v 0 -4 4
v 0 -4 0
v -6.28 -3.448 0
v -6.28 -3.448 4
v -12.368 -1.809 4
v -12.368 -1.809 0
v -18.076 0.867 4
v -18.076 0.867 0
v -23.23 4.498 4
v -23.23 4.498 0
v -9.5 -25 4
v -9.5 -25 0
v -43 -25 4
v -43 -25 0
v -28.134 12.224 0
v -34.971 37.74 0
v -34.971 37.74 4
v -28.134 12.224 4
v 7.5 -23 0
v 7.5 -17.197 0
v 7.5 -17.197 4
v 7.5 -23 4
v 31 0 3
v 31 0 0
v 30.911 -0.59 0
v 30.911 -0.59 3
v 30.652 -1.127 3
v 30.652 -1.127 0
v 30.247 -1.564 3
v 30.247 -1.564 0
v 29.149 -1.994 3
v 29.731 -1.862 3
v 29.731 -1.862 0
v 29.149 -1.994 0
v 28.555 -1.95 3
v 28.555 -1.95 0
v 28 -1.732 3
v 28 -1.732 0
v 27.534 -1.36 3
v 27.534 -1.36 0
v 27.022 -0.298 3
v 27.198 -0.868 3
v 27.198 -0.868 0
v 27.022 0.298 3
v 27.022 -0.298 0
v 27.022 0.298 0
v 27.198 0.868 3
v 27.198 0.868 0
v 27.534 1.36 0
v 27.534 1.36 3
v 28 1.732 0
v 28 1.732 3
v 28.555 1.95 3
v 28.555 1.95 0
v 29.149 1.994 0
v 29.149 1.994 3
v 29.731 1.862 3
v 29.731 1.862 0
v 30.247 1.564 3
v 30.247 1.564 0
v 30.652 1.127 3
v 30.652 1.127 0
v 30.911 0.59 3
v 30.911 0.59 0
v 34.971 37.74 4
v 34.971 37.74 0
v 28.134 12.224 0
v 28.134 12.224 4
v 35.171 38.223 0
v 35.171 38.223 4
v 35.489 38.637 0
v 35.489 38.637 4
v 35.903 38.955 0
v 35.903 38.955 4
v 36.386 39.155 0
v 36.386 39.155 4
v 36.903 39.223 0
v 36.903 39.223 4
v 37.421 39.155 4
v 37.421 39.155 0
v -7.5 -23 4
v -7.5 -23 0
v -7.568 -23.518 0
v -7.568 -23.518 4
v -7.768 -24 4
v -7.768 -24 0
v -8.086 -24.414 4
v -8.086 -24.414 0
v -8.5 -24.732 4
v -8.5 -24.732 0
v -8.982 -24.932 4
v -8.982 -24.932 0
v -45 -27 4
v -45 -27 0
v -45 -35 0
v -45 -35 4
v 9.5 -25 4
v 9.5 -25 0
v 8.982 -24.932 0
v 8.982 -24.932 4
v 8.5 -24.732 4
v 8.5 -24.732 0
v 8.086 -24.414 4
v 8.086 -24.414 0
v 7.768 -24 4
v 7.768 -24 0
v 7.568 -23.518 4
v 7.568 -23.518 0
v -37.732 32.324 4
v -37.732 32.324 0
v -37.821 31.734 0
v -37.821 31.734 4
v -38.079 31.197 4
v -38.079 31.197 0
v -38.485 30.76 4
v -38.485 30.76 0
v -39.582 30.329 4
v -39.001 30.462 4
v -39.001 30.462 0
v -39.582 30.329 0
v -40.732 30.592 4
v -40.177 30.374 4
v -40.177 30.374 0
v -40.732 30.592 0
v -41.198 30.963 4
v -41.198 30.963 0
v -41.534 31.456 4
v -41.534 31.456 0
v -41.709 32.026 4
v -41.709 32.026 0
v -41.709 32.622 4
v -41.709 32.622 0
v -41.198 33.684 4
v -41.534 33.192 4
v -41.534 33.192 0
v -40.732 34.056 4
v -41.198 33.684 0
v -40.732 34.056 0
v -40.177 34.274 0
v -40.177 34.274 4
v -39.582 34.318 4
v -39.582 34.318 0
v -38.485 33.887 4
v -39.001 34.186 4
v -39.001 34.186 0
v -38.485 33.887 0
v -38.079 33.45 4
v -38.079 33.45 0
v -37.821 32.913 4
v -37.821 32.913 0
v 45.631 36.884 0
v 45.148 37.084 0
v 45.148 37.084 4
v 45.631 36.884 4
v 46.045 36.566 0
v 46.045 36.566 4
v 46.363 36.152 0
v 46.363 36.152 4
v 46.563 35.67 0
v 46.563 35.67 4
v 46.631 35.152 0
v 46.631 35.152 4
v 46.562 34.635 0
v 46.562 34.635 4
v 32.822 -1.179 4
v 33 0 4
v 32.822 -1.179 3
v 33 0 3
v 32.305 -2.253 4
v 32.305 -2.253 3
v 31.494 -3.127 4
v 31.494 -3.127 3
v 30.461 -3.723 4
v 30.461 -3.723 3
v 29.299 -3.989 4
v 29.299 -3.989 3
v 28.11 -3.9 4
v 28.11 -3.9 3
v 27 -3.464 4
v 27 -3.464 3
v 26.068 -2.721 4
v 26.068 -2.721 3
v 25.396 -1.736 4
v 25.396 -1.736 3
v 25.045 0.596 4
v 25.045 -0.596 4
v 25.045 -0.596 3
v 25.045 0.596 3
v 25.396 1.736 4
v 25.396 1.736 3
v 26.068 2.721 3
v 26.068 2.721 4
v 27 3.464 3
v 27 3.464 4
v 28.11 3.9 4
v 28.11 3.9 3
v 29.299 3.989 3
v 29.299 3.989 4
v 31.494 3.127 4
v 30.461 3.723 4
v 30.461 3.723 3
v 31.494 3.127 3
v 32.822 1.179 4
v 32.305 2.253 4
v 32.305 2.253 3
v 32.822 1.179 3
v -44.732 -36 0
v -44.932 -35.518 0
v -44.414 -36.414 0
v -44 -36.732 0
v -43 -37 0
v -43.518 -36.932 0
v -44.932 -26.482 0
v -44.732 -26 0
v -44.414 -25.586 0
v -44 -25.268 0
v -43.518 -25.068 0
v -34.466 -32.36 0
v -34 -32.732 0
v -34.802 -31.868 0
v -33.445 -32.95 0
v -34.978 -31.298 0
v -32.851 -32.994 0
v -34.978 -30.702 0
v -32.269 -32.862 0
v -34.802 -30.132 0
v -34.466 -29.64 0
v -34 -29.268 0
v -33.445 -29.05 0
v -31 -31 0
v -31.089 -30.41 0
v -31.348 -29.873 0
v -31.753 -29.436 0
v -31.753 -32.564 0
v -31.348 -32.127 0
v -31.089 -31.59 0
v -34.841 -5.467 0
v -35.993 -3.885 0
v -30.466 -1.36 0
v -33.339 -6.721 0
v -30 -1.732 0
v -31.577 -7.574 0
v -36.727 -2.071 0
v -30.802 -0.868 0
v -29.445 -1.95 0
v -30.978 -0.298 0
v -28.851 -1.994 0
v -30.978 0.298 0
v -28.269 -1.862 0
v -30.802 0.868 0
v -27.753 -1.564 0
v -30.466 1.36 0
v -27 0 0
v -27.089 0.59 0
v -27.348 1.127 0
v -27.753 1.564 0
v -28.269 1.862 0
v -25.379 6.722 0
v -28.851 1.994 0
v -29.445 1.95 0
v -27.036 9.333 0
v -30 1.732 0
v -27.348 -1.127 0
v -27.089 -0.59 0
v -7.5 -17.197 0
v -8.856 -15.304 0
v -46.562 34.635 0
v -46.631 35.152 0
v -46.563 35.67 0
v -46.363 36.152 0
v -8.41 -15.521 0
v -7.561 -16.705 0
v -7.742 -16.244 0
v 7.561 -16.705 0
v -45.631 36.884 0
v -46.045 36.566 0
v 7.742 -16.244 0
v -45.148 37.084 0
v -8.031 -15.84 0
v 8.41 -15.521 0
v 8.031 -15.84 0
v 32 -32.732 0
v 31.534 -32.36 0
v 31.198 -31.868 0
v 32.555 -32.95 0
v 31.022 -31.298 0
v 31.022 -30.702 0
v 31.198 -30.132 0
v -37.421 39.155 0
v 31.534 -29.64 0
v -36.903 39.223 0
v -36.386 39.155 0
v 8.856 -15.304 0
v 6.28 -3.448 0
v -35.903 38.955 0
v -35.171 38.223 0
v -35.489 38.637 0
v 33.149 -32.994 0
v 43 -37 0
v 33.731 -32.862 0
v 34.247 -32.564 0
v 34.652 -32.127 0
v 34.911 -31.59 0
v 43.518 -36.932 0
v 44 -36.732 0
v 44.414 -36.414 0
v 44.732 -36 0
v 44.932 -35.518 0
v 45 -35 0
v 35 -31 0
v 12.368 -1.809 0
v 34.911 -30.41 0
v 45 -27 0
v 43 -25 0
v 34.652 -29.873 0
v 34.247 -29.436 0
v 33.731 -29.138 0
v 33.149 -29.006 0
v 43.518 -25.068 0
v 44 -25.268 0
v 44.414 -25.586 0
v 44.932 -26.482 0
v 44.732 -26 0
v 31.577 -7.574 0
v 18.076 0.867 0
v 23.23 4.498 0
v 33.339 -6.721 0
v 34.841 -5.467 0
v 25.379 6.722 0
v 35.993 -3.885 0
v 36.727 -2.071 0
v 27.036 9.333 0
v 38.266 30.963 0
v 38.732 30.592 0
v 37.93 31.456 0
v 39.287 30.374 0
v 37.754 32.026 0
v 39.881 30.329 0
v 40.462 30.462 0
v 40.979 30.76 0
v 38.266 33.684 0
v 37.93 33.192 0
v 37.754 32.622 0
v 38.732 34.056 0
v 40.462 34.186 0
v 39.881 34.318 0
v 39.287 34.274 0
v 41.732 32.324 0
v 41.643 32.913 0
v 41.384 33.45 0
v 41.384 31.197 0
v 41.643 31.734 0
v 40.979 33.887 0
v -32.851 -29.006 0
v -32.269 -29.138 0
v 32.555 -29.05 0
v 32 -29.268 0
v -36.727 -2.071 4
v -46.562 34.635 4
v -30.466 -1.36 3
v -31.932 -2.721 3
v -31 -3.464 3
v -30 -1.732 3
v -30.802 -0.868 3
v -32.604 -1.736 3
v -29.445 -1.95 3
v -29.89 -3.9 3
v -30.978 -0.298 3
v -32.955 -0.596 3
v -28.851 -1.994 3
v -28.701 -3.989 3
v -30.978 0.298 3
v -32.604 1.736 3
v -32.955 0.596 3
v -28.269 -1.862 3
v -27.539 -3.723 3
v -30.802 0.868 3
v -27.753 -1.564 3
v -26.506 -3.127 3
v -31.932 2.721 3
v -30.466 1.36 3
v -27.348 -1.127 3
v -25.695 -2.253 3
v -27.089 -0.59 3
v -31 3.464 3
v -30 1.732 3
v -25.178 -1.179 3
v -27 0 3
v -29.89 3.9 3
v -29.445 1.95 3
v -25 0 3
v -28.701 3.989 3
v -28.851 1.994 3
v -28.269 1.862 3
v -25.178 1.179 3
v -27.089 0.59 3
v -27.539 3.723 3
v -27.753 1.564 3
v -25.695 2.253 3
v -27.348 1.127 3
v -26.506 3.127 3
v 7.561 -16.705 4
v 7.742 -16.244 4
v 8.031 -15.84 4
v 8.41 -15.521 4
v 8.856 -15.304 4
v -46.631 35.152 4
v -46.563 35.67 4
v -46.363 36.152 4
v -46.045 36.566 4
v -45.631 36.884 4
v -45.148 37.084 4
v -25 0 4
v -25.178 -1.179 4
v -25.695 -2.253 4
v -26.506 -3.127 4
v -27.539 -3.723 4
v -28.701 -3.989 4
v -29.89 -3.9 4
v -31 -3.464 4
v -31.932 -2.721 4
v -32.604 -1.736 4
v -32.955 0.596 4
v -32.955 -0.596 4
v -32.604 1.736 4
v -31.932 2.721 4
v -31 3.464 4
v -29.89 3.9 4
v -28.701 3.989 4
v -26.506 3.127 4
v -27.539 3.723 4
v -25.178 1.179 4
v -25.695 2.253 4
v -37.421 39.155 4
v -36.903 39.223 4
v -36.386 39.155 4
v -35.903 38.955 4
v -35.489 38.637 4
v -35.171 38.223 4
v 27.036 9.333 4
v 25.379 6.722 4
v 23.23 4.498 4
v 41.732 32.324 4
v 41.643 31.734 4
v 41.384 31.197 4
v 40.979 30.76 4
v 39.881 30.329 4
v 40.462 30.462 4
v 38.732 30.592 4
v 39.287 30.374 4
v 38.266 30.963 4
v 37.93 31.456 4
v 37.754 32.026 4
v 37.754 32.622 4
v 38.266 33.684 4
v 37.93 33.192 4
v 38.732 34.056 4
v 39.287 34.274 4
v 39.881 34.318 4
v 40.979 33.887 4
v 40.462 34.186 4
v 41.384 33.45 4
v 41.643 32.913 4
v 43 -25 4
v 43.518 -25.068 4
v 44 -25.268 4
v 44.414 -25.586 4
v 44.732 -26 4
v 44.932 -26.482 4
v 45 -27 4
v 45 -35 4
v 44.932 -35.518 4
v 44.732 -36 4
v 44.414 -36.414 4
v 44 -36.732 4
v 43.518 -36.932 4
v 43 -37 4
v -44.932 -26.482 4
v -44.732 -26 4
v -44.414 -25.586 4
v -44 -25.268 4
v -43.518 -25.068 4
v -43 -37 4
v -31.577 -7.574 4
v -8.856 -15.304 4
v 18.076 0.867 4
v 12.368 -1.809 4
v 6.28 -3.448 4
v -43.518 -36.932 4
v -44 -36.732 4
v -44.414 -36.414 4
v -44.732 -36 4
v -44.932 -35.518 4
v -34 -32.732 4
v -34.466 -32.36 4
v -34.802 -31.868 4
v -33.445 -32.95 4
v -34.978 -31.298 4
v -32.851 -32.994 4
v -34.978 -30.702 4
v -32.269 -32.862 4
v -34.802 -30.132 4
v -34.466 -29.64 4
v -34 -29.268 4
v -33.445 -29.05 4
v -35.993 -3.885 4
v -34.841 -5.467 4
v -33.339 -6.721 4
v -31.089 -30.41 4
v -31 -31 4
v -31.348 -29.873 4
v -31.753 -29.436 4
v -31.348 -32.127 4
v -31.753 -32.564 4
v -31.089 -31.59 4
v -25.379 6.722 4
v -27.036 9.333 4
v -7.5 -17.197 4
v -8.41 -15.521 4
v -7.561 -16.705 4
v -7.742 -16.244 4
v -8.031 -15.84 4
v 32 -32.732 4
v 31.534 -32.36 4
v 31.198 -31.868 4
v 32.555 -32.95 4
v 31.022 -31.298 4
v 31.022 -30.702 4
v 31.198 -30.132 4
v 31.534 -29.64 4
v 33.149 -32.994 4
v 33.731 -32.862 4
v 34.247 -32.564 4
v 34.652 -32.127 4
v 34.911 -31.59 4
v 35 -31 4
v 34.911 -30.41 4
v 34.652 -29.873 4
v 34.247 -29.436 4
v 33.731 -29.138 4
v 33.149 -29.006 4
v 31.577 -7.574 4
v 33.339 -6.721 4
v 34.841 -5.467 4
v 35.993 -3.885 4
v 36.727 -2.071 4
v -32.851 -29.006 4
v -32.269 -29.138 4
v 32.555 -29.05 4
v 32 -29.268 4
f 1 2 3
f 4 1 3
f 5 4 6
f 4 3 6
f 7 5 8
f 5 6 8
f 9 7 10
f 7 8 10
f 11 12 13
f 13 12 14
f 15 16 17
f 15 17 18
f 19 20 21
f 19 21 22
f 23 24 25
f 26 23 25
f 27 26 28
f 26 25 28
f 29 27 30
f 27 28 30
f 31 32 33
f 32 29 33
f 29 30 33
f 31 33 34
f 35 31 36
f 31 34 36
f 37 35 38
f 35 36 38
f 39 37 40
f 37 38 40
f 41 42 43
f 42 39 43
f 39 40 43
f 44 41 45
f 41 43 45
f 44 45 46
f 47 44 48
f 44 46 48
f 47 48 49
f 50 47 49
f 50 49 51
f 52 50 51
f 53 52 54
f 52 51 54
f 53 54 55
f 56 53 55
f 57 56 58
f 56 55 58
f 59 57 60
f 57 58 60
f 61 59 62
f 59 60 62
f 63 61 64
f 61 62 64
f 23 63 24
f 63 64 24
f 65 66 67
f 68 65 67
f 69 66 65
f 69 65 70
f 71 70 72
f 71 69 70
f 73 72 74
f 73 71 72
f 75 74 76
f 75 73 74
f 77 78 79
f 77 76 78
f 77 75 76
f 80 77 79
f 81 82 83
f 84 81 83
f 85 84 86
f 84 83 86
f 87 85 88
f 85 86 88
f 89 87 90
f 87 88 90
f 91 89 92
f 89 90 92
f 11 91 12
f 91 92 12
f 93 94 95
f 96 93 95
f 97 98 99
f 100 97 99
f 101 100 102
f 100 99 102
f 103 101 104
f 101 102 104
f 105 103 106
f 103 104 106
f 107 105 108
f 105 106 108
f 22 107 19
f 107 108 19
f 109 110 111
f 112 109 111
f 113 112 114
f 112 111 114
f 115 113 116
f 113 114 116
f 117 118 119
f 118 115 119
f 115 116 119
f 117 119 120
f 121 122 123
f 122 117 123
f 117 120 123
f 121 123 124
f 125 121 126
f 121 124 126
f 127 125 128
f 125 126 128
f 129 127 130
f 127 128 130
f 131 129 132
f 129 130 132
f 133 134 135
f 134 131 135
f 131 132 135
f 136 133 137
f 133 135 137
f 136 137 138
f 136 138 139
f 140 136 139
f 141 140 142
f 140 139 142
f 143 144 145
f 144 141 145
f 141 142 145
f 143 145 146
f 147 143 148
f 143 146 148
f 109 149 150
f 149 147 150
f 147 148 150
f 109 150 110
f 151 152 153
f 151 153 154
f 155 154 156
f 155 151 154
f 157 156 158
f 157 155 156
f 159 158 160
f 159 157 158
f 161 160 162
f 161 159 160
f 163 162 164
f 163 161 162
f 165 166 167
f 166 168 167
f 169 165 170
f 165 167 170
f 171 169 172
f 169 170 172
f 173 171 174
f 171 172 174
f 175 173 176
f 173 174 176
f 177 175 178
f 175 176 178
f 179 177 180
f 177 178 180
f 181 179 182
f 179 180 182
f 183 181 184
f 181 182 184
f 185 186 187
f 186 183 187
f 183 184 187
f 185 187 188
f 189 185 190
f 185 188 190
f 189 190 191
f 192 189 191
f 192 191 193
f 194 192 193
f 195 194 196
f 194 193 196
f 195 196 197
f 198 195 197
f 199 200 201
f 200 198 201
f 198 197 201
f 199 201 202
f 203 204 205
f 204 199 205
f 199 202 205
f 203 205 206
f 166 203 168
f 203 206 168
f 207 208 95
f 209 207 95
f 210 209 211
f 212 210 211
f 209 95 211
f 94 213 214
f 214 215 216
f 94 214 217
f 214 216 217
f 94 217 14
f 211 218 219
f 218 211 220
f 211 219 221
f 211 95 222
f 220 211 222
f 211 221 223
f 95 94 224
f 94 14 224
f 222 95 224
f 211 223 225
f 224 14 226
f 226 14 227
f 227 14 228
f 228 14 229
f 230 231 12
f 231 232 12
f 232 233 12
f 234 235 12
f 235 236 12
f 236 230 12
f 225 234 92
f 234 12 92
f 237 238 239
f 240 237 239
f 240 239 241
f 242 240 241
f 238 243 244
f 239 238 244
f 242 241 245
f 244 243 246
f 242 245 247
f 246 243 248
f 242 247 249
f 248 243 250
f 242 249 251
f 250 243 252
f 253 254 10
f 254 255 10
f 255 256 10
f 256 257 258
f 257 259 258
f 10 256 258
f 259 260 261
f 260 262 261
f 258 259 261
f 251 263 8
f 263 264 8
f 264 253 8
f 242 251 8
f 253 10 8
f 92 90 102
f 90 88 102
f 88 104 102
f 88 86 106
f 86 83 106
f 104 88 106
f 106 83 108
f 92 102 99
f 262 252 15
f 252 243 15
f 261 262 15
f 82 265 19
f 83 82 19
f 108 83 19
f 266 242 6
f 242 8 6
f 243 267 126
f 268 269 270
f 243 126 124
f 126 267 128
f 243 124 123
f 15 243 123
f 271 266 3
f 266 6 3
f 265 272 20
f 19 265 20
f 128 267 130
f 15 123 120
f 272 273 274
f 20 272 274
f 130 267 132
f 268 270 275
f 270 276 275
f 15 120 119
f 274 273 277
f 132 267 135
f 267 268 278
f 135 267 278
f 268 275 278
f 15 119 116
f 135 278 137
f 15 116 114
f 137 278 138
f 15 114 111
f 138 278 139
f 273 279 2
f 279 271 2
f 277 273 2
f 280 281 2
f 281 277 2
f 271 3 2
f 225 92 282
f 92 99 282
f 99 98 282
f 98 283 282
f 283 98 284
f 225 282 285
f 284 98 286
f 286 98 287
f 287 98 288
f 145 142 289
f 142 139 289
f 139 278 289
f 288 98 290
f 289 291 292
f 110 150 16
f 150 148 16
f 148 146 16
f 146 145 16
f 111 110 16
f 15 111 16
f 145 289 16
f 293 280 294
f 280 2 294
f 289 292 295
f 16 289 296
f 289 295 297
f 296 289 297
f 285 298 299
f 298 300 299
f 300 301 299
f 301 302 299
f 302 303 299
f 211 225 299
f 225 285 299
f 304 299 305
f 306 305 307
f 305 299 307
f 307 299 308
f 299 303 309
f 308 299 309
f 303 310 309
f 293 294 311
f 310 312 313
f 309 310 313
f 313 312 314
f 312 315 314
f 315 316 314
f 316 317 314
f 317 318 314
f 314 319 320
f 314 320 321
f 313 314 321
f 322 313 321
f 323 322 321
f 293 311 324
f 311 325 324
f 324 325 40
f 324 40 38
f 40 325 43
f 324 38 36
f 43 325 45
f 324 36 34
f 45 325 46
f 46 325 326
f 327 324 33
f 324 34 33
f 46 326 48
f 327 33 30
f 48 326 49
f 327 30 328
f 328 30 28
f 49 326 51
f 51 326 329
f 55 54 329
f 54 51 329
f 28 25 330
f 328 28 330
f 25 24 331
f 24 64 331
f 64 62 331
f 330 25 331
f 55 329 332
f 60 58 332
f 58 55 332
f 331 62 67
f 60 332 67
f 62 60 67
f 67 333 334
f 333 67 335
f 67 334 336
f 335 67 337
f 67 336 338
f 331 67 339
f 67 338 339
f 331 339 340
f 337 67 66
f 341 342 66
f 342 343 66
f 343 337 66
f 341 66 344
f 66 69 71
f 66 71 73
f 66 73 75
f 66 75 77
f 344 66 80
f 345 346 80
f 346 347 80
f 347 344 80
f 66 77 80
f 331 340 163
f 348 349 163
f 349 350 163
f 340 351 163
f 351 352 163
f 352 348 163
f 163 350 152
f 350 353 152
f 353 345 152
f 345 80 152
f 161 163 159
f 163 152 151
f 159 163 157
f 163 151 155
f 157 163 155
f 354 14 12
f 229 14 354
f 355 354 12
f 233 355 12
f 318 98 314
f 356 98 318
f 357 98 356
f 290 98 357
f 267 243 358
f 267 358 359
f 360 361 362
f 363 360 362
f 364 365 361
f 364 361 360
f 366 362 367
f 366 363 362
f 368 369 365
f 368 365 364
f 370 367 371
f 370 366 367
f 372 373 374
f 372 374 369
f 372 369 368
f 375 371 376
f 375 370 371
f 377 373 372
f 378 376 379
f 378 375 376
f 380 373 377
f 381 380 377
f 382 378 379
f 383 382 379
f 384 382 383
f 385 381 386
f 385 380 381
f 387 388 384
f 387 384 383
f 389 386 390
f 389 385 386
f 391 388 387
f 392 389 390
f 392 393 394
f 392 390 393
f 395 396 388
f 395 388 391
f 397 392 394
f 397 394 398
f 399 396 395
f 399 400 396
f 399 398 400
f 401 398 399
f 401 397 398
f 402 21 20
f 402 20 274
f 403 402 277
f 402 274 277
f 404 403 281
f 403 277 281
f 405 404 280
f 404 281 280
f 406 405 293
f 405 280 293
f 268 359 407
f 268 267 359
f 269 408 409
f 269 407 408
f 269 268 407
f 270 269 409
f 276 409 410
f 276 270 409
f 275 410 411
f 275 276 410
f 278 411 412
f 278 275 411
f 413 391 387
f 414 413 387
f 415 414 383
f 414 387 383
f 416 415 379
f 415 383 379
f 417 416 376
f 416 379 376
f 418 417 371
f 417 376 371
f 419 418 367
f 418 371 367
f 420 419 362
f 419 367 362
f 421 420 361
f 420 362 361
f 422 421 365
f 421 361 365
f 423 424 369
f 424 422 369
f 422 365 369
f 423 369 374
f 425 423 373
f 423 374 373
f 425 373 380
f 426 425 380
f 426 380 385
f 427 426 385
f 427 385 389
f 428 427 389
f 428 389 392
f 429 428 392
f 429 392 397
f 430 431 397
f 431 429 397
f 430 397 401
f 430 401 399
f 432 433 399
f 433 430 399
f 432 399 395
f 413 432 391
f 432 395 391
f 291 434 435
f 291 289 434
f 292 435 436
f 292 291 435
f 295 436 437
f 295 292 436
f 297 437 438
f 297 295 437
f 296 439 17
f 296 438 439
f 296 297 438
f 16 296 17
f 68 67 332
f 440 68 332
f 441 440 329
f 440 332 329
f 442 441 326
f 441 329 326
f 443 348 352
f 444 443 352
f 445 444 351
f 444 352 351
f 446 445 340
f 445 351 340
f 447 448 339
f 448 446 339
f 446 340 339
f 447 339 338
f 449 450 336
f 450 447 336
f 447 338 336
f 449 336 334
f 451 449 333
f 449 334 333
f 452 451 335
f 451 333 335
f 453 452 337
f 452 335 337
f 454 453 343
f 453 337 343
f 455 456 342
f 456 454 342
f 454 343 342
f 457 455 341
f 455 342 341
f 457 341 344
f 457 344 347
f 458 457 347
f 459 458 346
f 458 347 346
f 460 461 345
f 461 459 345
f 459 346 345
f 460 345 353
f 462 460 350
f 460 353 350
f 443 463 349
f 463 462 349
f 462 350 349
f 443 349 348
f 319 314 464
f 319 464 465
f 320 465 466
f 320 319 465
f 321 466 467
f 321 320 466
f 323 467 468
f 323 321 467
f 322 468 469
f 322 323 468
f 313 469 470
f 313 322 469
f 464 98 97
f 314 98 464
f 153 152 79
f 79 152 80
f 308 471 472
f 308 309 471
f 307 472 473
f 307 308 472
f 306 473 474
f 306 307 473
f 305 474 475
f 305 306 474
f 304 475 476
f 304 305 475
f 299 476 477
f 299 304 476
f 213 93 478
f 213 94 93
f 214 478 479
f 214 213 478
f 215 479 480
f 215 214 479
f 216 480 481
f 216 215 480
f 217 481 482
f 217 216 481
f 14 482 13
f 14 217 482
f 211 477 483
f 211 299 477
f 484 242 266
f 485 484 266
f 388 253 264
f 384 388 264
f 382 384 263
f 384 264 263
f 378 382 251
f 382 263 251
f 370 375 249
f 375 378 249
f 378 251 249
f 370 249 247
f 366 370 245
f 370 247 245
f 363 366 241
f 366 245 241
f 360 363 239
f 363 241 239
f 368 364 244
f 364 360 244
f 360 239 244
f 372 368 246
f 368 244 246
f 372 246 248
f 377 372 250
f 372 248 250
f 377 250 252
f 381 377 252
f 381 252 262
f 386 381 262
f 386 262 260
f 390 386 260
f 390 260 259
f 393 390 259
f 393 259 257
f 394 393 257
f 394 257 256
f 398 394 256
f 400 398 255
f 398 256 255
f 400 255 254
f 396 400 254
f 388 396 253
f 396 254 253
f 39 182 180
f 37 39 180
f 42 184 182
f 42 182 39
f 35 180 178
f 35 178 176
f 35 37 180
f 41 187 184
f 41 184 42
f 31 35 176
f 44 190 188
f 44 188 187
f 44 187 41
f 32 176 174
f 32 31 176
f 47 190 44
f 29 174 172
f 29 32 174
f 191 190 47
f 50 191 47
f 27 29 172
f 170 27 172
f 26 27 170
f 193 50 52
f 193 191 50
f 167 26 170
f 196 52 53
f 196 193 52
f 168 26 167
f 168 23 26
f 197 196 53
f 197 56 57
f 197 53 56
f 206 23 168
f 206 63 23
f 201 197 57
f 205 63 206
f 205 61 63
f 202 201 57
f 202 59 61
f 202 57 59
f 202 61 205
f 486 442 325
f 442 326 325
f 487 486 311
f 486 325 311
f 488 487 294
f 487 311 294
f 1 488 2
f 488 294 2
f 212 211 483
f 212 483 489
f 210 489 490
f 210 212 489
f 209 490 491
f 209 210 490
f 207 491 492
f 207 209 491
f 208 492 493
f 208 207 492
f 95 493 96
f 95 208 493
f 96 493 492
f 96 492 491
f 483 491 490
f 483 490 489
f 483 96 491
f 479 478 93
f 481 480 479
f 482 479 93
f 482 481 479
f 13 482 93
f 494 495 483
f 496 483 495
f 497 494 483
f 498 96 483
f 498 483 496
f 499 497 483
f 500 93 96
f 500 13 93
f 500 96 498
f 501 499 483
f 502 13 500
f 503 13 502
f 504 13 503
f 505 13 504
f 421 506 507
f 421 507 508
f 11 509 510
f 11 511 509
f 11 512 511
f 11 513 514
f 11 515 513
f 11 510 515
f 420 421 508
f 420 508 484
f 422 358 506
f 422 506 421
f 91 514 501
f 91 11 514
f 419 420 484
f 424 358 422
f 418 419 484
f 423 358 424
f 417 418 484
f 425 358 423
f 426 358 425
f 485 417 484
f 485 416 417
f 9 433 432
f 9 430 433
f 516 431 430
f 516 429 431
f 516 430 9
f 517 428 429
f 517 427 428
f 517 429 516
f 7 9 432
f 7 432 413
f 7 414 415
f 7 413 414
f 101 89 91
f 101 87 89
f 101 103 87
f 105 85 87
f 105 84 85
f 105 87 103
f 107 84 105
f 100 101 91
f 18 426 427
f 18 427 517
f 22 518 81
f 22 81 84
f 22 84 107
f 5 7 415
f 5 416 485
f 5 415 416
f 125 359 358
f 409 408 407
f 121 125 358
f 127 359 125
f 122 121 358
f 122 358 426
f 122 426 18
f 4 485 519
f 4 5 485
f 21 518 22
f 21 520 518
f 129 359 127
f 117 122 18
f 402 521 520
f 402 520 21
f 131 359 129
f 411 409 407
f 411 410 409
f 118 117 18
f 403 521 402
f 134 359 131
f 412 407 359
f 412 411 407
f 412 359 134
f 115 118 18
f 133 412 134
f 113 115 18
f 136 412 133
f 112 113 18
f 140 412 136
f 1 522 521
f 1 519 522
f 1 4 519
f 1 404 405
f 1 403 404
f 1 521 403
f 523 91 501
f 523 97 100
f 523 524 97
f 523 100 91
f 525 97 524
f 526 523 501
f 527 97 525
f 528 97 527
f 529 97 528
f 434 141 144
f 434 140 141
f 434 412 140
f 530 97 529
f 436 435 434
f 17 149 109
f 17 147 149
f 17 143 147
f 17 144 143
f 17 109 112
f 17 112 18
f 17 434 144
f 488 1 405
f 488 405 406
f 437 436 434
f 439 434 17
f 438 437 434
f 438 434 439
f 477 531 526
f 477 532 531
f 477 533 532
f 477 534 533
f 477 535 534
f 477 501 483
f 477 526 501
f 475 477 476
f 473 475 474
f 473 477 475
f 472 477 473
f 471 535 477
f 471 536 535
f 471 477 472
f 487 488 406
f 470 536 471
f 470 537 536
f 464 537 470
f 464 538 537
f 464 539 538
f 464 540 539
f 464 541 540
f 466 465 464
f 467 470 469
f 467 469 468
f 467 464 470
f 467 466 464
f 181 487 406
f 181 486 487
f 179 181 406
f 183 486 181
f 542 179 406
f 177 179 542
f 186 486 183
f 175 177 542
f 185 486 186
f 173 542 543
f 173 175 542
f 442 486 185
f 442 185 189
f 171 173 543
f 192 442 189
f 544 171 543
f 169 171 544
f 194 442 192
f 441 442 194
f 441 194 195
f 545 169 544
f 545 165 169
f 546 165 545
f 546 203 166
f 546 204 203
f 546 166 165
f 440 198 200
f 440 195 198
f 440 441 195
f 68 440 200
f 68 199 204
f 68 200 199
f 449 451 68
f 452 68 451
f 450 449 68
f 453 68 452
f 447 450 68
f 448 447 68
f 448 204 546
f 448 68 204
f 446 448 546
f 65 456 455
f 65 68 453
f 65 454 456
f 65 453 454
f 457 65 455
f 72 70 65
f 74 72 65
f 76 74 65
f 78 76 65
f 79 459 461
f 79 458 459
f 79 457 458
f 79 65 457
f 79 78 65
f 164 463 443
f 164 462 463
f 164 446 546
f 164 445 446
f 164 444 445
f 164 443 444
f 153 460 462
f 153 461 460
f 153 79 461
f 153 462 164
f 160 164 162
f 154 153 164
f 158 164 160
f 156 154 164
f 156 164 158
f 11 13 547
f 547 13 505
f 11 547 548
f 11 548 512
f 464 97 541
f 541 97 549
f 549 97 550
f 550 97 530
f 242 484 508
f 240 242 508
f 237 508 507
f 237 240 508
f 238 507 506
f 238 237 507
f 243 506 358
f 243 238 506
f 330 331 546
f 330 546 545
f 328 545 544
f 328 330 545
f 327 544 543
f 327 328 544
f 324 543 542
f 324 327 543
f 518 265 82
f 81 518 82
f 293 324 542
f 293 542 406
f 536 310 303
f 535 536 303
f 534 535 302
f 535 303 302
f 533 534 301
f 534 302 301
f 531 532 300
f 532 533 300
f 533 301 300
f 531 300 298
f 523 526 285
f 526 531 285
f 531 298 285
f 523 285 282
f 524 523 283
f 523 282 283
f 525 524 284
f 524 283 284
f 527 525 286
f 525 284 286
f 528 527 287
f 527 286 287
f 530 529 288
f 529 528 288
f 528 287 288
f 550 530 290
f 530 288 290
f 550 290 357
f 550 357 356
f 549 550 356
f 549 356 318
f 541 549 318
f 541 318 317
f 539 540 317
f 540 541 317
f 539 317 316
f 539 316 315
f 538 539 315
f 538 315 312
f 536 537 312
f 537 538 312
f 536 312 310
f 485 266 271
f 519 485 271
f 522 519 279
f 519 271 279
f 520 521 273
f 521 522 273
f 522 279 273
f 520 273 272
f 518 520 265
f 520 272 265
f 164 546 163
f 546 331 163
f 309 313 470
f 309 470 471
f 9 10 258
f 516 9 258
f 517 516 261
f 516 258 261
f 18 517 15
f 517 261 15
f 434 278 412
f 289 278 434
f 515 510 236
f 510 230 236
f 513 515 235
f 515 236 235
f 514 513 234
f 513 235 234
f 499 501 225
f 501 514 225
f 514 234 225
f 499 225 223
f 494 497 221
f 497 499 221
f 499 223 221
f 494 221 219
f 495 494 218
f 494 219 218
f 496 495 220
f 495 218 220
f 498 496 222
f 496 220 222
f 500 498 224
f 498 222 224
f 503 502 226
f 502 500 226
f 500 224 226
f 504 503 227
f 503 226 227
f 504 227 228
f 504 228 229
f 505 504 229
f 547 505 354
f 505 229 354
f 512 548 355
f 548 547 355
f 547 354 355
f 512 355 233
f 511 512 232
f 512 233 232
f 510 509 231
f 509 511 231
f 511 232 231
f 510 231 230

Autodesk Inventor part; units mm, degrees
ref_plane "YZ Plane" through (0, 0, 0) normal (1, 0, 0) x (0, 1, 0)
ref_plane "XZ Plane" through (0, 0, 0) normal (0, 1, 0) x (-1, 0, 0)
ref_plane "XY Plane" through (0, 0, 0) normal (0, 0, 1) x (1, 0, 0)
sketch "Sketch1" plane through (0, 0, 0) normal (0, 0, 1) x (1, 0, 0)
  circle A0 centre (-29, 0) radius 2
  line L0 (-62.2888, 0) -> (62.2888, 0) construction
  arc A1 (-36.7274, -2.0706) -> (-31.5768, -7.5737) centre (-29, 0) ccw
  arc A2 (-23.2301, 4.498) -> (0, -4) centre (0, 32) ccw
  line L1 (0, -55.9324) -> (0, 55.5944) construction
  line L2 (-31.5768, -7.5737) -> (-8.8558, -15.304)
  line L3 (-7.5, -17.1974) -> (-7.5, -23)
  line L4 (-36.7274, -2.0706) -> (-46.5625, 34.6346)
  line L5 (-45.1483, 37.0841) -> (-37.4209, 39.1547)
  line L6 (-34.9714, 37.7405) -> (-28.1342, 12.2236)
  arc A3 (-7.5, -17.1974) -> (-8.8558, -15.304) centre (-9.5, -17.1974) ccw
  arc A4 (-45.1483, 37.0841) -> (-46.5625, 34.6346) centre (-44.6307, 35.1523) ccw
  arc A5 (-34.9714, 37.7405) -> (-37.4209, 39.1547) centre (-36.9033, 37.2228) ccw
  circle A6 centre (29, 0) radius 2
  line L7 (62.2888, 0) -> (-62.2888, 0) construction
  arc A7 (31.5768, -7.5737) -> (36.7274, -2.0706) centre (29, 0) ccw
  line L8 (31.5768, -7.5737) -> (8.8558, -15.304)
  line L9 (7.5, -17.1974) -> (7.5, -25)
  line L10 (36.7274, -2.0706) -> (46.5625, 34.6346)
  line L11 (45.1483, 37.0841) -> (37.4209, 39.1547)
  arc A8 (8.8558, -15.304) -> (7.5, -17.1974) centre (9.5, -17.1974) ccw
  arc A9 (46.5625, 34.6346) -> (45.1483, 37.0841) centre (44.6307, 35.1523) ccw
  arc A10 (37.4209, 39.1547) -> (34.9714, 37.7405) centre (36.9033, 37.2228) ccw
  circle A11 centre (-29, 0) radius 4
  circle A12 centre (29, 0) radius 4
  line L12 (-9.5, -25) -> (-43, -25)
  line L13 (-45, -27) -> (-45, -35)
  line L14 (-43, -37) -> (0, -37)
  arc A13 (-43, -25) -> (-45, -27) centre (-43, -27) ccw
  arc A14 (-45, -35) -> (-43, -37) centre (-43, -35) ccw
  arc A15 (-9.5, -25) -> (-7.5, -23) centre (-9.5, -23) ccw
  line L15 (9.5, -25) -> (43, -25)
  line L16 (45, -27) -> (45, -35)
  line L17 (43, -37) -> (0, -37)
  arc A16 (45, -27) -> (43, -25) centre (43, -27) ccw
  arc A17 (43, -37) -> (45, -35) centre (43, -35) ccw
  arc A18 (7.5, -23) -> (9.5, -25) centre (9.5, -23) ccw
  arc A19 (-28.1342, 12.2236) -> (-23.2301, 4.498) centre (-13.3609, 16.1821) ccw
  arc A20 (0, -4) -> (23.2301, 4.498) centre (0, 32) ccw
  line L18 (34.9714, 37.7405) -> (28.1342, 12.2236)
  arc A21 (23.2301, 4.498) -> (28.1342, 12.2236) centre (13.3609, 16.1821) ccw
  circle A22 centre (-39.7317, 32.3238) radius 2
  circle A23 centre (39.7317, 32.3238) radius 2
  circle A24 centre (-33, -31) radius 2
  circle A25 centre (33, -31) radius 2
  point P0 (0, 0)
  point P1 (-7.5, -15.7653)
  point P2 (-47.0802, 36.5665)
  point P3 (-26.9294, 7.7274)
  point P4 (-7.5, -25)
  point P5 (-15, -20)
  point P6 (7.5, -15.7653)
  point P7 (47.0802, 36.5665)
  point P8 (15, -20)
  point P9 (-29, -40)
  point P10 (-45, -25)
  point P11 (-45, -37)
  point P12 (45, -25)
  point P13 (45, -37)
  point P14 (7.5, -23)
  dimension "d0" = 4
  dimension "d1" = 58
  dimension "d7" = 2
  dimension "d9" = 15
  dimension "d12" = 20
  dimension "d13" = 30
  dimension "d15" = 2
  dimension "d19" = 8
  dimension "d20" = 15
  dimension "d21" = 15
  dimension "d22" = 12
  dimension "d24" = 4
  dimension "d26" = 24
  dimension "d28" = 40
  dimension "d40" = 8
  dimension "d45" = 40
  dimension "d46" = 58
  dimension "d47" = 2
  dimension "d48" = 12
  dimension "d49" = 25
  dimension "d50" = 90
  dimension "d53" = 36
  dimension "d54" = 15.2944
  dimension "d55" = 4
  dimension "d56" = 6
  dimension "d57" = 6
  dimension "d61" = 4
  dimension "d62" = 12
  dimension "d63" = 6
extrude "Extrusion3" add sketch "Sketch1" along normal blind 3 contours A11 | A12
extrude "Extrusion4" add sketch "Sketch1" along normal blind 4 contours L4 A4 L5 A5 L6 A19 A2 A20 A21 L18 A10 L11 A9 L10 A7 L8 A8 L9 A18 L15 A16 L16 A17 L17 L14 A14 L13 A13 L12 A15 L3 A3 L2 A1
properties part number "UnitreeGO2_frontmount"
